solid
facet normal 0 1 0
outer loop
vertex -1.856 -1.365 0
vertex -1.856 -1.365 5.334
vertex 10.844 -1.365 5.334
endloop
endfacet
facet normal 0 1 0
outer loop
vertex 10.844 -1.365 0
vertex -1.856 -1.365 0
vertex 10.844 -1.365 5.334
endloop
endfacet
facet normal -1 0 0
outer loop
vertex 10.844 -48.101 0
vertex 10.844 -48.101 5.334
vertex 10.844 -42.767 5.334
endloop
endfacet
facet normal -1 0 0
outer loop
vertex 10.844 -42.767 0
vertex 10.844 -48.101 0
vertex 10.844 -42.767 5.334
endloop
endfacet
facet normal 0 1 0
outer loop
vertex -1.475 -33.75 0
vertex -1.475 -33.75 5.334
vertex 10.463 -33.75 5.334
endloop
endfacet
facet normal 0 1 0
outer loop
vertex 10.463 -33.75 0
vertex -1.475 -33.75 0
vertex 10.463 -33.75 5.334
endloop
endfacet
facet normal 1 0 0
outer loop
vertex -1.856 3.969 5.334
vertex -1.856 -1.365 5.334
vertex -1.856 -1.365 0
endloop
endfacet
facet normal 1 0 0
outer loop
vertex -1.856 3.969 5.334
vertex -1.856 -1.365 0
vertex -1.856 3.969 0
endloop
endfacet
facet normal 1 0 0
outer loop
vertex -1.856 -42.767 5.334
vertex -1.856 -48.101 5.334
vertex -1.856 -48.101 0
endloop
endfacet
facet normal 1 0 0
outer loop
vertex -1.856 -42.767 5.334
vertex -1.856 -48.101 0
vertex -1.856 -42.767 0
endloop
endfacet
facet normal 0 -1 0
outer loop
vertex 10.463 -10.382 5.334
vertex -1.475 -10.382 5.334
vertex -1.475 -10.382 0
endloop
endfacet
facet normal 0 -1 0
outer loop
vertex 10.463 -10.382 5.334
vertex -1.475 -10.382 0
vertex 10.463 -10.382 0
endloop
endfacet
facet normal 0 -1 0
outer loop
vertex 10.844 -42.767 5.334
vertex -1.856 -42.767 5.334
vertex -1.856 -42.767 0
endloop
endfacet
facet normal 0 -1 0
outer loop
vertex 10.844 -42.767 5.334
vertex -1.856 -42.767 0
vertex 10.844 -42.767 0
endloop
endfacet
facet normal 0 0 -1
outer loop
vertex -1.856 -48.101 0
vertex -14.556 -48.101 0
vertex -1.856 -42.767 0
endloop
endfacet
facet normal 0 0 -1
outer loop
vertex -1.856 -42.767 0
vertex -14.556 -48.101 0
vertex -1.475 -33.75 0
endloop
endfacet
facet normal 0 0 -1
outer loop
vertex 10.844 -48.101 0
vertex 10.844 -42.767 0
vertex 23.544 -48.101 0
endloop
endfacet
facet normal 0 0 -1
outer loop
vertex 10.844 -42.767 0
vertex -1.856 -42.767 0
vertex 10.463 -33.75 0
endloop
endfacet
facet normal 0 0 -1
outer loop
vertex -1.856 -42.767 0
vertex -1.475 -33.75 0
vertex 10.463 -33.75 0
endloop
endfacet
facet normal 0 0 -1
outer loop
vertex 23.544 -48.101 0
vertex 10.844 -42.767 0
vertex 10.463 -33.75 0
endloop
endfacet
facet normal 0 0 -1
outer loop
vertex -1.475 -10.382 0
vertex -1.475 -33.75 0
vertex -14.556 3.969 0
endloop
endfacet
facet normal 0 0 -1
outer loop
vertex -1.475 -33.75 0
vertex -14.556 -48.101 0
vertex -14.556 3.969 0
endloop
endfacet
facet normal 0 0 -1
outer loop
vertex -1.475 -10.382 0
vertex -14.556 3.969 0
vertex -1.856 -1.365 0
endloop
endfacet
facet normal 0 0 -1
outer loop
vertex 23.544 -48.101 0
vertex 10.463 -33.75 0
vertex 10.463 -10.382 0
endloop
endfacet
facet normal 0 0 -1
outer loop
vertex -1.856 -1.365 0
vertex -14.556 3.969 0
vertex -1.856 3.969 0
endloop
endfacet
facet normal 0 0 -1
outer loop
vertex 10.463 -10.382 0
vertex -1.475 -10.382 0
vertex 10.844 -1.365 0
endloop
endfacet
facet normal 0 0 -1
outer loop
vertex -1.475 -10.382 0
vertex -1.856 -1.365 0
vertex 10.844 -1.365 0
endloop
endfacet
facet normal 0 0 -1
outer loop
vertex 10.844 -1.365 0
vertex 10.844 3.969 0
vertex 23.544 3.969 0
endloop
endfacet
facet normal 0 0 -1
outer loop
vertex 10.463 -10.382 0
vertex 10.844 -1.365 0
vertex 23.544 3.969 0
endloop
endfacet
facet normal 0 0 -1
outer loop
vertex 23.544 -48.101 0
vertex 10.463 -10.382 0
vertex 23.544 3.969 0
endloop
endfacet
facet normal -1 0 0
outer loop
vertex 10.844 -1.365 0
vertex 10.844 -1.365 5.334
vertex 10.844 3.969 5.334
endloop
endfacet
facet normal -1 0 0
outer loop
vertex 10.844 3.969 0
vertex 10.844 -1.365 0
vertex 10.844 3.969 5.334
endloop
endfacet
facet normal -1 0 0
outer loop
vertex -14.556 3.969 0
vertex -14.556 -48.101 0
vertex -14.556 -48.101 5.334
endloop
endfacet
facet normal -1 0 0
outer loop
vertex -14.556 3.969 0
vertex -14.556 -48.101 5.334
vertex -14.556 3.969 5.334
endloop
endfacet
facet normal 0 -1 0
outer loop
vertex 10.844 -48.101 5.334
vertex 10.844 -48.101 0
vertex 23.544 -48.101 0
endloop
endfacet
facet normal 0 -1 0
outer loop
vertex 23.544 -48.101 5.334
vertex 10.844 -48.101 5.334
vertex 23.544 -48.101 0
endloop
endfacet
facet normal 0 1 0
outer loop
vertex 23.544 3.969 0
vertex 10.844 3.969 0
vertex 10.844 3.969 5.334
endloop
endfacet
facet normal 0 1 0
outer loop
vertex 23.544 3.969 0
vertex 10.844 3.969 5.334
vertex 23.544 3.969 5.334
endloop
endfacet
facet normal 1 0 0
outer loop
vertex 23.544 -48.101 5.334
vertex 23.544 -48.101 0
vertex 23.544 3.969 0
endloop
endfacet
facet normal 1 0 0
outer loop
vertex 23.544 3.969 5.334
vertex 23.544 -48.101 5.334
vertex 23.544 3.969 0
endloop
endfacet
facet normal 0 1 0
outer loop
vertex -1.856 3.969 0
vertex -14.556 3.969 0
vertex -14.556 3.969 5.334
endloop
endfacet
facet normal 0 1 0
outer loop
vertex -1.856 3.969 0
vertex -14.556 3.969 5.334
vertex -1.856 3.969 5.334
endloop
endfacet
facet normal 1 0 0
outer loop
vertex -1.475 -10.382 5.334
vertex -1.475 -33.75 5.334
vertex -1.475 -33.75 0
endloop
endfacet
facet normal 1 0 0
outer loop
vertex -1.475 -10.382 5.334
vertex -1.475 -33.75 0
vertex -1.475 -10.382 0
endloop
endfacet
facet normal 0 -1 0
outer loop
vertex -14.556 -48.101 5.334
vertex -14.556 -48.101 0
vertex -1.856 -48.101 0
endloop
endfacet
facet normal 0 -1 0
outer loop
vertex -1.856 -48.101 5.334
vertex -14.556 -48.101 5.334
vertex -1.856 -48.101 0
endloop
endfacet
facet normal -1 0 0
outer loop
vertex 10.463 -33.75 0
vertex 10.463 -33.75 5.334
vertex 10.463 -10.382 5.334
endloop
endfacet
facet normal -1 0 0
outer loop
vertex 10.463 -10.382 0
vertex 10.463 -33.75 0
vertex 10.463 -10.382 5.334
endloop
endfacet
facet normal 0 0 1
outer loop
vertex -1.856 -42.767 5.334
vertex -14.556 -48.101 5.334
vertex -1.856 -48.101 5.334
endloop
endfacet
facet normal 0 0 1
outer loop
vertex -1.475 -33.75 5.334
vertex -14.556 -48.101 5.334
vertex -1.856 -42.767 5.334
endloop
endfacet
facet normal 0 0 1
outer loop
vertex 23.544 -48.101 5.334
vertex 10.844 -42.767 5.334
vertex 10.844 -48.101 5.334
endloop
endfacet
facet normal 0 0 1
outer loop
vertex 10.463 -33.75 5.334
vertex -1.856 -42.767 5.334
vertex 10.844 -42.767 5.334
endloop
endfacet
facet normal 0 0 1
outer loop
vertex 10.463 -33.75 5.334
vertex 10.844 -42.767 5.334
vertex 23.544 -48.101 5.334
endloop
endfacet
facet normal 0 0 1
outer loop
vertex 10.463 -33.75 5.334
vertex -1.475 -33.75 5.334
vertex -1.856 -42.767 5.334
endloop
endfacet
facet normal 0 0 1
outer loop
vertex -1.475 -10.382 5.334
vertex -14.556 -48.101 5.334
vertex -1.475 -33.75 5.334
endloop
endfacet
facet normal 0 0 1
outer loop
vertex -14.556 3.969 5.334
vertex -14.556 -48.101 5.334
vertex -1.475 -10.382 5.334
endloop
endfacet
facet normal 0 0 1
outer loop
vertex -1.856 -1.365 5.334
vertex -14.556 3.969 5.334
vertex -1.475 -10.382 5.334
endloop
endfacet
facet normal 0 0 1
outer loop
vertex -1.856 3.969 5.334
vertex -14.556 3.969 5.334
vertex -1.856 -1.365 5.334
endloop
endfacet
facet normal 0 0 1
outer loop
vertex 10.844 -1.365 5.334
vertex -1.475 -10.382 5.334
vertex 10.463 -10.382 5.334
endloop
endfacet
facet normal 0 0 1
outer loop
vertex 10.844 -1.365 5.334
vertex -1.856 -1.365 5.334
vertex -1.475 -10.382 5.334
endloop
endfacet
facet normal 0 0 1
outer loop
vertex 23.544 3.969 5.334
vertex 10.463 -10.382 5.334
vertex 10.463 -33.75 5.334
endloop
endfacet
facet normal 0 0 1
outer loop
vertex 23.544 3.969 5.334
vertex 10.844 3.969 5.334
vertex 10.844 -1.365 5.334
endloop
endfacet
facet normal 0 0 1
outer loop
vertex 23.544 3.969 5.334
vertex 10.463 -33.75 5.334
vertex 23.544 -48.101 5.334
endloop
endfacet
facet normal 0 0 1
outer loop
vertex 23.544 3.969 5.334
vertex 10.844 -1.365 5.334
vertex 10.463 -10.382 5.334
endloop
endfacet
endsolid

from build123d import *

# Parameters (mm, degrees)
SKETCH1_W           = 38.1
SKETCH1_H           = 52.07
BOSS_EXTRUDE1_DEPTH = 5.334
SKETCH2_W           = 11.938
SKETCH2_H           = 23.368
CUT_EXTRUDE1_DEPTH  = 54.818475018
SKETCH3_W           = 12.7
SKETCH3_H           = 5.334
CUT_EXTRUDE2_DEPTH  = 54.818475018


with BuildPart() as part:
    # Sketch1 → Boss-Extrude1 (new body)
    with BuildSketch(Plane.XY):
        with Locations((4.493611175, -22.065676399)):
            Rectangle(SKETCH1_W, SKETCH1_H)
    extrude(amount=BOSS_EXTRUDE1_DEPTH)

    # Sketch2 → Cut-Extrude1 (cut, through all)
    with BuildSketch(Plane.XY.offset(5.334)):
        with Locations((4.493611175, -22.065676399)):
            Rectangle(SKETCH2_W, SKETCH2_H)
    extrude(amount=-CUT_EXTRUDE1_DEPTH, mode=Mode.SUBTRACT)

    # Sketch3 → Cut-Extrude2 (cut, through all)
    with BuildSketch(Plane.XY.offset(5.334)):
        with Locations((4.493611175, 1.302323601)):
            Rectangle(SKETCH3_W, SKETCH3_H)
        with Locations((4.493611175, -45.433676399)):
            Rectangle(SKETCH3_W, SKETCH3_H)
    extrude(amount=-CUT_EXTRUDE2_DEPTH, mode=Mode.SUBTRACT)


solid = part.part
